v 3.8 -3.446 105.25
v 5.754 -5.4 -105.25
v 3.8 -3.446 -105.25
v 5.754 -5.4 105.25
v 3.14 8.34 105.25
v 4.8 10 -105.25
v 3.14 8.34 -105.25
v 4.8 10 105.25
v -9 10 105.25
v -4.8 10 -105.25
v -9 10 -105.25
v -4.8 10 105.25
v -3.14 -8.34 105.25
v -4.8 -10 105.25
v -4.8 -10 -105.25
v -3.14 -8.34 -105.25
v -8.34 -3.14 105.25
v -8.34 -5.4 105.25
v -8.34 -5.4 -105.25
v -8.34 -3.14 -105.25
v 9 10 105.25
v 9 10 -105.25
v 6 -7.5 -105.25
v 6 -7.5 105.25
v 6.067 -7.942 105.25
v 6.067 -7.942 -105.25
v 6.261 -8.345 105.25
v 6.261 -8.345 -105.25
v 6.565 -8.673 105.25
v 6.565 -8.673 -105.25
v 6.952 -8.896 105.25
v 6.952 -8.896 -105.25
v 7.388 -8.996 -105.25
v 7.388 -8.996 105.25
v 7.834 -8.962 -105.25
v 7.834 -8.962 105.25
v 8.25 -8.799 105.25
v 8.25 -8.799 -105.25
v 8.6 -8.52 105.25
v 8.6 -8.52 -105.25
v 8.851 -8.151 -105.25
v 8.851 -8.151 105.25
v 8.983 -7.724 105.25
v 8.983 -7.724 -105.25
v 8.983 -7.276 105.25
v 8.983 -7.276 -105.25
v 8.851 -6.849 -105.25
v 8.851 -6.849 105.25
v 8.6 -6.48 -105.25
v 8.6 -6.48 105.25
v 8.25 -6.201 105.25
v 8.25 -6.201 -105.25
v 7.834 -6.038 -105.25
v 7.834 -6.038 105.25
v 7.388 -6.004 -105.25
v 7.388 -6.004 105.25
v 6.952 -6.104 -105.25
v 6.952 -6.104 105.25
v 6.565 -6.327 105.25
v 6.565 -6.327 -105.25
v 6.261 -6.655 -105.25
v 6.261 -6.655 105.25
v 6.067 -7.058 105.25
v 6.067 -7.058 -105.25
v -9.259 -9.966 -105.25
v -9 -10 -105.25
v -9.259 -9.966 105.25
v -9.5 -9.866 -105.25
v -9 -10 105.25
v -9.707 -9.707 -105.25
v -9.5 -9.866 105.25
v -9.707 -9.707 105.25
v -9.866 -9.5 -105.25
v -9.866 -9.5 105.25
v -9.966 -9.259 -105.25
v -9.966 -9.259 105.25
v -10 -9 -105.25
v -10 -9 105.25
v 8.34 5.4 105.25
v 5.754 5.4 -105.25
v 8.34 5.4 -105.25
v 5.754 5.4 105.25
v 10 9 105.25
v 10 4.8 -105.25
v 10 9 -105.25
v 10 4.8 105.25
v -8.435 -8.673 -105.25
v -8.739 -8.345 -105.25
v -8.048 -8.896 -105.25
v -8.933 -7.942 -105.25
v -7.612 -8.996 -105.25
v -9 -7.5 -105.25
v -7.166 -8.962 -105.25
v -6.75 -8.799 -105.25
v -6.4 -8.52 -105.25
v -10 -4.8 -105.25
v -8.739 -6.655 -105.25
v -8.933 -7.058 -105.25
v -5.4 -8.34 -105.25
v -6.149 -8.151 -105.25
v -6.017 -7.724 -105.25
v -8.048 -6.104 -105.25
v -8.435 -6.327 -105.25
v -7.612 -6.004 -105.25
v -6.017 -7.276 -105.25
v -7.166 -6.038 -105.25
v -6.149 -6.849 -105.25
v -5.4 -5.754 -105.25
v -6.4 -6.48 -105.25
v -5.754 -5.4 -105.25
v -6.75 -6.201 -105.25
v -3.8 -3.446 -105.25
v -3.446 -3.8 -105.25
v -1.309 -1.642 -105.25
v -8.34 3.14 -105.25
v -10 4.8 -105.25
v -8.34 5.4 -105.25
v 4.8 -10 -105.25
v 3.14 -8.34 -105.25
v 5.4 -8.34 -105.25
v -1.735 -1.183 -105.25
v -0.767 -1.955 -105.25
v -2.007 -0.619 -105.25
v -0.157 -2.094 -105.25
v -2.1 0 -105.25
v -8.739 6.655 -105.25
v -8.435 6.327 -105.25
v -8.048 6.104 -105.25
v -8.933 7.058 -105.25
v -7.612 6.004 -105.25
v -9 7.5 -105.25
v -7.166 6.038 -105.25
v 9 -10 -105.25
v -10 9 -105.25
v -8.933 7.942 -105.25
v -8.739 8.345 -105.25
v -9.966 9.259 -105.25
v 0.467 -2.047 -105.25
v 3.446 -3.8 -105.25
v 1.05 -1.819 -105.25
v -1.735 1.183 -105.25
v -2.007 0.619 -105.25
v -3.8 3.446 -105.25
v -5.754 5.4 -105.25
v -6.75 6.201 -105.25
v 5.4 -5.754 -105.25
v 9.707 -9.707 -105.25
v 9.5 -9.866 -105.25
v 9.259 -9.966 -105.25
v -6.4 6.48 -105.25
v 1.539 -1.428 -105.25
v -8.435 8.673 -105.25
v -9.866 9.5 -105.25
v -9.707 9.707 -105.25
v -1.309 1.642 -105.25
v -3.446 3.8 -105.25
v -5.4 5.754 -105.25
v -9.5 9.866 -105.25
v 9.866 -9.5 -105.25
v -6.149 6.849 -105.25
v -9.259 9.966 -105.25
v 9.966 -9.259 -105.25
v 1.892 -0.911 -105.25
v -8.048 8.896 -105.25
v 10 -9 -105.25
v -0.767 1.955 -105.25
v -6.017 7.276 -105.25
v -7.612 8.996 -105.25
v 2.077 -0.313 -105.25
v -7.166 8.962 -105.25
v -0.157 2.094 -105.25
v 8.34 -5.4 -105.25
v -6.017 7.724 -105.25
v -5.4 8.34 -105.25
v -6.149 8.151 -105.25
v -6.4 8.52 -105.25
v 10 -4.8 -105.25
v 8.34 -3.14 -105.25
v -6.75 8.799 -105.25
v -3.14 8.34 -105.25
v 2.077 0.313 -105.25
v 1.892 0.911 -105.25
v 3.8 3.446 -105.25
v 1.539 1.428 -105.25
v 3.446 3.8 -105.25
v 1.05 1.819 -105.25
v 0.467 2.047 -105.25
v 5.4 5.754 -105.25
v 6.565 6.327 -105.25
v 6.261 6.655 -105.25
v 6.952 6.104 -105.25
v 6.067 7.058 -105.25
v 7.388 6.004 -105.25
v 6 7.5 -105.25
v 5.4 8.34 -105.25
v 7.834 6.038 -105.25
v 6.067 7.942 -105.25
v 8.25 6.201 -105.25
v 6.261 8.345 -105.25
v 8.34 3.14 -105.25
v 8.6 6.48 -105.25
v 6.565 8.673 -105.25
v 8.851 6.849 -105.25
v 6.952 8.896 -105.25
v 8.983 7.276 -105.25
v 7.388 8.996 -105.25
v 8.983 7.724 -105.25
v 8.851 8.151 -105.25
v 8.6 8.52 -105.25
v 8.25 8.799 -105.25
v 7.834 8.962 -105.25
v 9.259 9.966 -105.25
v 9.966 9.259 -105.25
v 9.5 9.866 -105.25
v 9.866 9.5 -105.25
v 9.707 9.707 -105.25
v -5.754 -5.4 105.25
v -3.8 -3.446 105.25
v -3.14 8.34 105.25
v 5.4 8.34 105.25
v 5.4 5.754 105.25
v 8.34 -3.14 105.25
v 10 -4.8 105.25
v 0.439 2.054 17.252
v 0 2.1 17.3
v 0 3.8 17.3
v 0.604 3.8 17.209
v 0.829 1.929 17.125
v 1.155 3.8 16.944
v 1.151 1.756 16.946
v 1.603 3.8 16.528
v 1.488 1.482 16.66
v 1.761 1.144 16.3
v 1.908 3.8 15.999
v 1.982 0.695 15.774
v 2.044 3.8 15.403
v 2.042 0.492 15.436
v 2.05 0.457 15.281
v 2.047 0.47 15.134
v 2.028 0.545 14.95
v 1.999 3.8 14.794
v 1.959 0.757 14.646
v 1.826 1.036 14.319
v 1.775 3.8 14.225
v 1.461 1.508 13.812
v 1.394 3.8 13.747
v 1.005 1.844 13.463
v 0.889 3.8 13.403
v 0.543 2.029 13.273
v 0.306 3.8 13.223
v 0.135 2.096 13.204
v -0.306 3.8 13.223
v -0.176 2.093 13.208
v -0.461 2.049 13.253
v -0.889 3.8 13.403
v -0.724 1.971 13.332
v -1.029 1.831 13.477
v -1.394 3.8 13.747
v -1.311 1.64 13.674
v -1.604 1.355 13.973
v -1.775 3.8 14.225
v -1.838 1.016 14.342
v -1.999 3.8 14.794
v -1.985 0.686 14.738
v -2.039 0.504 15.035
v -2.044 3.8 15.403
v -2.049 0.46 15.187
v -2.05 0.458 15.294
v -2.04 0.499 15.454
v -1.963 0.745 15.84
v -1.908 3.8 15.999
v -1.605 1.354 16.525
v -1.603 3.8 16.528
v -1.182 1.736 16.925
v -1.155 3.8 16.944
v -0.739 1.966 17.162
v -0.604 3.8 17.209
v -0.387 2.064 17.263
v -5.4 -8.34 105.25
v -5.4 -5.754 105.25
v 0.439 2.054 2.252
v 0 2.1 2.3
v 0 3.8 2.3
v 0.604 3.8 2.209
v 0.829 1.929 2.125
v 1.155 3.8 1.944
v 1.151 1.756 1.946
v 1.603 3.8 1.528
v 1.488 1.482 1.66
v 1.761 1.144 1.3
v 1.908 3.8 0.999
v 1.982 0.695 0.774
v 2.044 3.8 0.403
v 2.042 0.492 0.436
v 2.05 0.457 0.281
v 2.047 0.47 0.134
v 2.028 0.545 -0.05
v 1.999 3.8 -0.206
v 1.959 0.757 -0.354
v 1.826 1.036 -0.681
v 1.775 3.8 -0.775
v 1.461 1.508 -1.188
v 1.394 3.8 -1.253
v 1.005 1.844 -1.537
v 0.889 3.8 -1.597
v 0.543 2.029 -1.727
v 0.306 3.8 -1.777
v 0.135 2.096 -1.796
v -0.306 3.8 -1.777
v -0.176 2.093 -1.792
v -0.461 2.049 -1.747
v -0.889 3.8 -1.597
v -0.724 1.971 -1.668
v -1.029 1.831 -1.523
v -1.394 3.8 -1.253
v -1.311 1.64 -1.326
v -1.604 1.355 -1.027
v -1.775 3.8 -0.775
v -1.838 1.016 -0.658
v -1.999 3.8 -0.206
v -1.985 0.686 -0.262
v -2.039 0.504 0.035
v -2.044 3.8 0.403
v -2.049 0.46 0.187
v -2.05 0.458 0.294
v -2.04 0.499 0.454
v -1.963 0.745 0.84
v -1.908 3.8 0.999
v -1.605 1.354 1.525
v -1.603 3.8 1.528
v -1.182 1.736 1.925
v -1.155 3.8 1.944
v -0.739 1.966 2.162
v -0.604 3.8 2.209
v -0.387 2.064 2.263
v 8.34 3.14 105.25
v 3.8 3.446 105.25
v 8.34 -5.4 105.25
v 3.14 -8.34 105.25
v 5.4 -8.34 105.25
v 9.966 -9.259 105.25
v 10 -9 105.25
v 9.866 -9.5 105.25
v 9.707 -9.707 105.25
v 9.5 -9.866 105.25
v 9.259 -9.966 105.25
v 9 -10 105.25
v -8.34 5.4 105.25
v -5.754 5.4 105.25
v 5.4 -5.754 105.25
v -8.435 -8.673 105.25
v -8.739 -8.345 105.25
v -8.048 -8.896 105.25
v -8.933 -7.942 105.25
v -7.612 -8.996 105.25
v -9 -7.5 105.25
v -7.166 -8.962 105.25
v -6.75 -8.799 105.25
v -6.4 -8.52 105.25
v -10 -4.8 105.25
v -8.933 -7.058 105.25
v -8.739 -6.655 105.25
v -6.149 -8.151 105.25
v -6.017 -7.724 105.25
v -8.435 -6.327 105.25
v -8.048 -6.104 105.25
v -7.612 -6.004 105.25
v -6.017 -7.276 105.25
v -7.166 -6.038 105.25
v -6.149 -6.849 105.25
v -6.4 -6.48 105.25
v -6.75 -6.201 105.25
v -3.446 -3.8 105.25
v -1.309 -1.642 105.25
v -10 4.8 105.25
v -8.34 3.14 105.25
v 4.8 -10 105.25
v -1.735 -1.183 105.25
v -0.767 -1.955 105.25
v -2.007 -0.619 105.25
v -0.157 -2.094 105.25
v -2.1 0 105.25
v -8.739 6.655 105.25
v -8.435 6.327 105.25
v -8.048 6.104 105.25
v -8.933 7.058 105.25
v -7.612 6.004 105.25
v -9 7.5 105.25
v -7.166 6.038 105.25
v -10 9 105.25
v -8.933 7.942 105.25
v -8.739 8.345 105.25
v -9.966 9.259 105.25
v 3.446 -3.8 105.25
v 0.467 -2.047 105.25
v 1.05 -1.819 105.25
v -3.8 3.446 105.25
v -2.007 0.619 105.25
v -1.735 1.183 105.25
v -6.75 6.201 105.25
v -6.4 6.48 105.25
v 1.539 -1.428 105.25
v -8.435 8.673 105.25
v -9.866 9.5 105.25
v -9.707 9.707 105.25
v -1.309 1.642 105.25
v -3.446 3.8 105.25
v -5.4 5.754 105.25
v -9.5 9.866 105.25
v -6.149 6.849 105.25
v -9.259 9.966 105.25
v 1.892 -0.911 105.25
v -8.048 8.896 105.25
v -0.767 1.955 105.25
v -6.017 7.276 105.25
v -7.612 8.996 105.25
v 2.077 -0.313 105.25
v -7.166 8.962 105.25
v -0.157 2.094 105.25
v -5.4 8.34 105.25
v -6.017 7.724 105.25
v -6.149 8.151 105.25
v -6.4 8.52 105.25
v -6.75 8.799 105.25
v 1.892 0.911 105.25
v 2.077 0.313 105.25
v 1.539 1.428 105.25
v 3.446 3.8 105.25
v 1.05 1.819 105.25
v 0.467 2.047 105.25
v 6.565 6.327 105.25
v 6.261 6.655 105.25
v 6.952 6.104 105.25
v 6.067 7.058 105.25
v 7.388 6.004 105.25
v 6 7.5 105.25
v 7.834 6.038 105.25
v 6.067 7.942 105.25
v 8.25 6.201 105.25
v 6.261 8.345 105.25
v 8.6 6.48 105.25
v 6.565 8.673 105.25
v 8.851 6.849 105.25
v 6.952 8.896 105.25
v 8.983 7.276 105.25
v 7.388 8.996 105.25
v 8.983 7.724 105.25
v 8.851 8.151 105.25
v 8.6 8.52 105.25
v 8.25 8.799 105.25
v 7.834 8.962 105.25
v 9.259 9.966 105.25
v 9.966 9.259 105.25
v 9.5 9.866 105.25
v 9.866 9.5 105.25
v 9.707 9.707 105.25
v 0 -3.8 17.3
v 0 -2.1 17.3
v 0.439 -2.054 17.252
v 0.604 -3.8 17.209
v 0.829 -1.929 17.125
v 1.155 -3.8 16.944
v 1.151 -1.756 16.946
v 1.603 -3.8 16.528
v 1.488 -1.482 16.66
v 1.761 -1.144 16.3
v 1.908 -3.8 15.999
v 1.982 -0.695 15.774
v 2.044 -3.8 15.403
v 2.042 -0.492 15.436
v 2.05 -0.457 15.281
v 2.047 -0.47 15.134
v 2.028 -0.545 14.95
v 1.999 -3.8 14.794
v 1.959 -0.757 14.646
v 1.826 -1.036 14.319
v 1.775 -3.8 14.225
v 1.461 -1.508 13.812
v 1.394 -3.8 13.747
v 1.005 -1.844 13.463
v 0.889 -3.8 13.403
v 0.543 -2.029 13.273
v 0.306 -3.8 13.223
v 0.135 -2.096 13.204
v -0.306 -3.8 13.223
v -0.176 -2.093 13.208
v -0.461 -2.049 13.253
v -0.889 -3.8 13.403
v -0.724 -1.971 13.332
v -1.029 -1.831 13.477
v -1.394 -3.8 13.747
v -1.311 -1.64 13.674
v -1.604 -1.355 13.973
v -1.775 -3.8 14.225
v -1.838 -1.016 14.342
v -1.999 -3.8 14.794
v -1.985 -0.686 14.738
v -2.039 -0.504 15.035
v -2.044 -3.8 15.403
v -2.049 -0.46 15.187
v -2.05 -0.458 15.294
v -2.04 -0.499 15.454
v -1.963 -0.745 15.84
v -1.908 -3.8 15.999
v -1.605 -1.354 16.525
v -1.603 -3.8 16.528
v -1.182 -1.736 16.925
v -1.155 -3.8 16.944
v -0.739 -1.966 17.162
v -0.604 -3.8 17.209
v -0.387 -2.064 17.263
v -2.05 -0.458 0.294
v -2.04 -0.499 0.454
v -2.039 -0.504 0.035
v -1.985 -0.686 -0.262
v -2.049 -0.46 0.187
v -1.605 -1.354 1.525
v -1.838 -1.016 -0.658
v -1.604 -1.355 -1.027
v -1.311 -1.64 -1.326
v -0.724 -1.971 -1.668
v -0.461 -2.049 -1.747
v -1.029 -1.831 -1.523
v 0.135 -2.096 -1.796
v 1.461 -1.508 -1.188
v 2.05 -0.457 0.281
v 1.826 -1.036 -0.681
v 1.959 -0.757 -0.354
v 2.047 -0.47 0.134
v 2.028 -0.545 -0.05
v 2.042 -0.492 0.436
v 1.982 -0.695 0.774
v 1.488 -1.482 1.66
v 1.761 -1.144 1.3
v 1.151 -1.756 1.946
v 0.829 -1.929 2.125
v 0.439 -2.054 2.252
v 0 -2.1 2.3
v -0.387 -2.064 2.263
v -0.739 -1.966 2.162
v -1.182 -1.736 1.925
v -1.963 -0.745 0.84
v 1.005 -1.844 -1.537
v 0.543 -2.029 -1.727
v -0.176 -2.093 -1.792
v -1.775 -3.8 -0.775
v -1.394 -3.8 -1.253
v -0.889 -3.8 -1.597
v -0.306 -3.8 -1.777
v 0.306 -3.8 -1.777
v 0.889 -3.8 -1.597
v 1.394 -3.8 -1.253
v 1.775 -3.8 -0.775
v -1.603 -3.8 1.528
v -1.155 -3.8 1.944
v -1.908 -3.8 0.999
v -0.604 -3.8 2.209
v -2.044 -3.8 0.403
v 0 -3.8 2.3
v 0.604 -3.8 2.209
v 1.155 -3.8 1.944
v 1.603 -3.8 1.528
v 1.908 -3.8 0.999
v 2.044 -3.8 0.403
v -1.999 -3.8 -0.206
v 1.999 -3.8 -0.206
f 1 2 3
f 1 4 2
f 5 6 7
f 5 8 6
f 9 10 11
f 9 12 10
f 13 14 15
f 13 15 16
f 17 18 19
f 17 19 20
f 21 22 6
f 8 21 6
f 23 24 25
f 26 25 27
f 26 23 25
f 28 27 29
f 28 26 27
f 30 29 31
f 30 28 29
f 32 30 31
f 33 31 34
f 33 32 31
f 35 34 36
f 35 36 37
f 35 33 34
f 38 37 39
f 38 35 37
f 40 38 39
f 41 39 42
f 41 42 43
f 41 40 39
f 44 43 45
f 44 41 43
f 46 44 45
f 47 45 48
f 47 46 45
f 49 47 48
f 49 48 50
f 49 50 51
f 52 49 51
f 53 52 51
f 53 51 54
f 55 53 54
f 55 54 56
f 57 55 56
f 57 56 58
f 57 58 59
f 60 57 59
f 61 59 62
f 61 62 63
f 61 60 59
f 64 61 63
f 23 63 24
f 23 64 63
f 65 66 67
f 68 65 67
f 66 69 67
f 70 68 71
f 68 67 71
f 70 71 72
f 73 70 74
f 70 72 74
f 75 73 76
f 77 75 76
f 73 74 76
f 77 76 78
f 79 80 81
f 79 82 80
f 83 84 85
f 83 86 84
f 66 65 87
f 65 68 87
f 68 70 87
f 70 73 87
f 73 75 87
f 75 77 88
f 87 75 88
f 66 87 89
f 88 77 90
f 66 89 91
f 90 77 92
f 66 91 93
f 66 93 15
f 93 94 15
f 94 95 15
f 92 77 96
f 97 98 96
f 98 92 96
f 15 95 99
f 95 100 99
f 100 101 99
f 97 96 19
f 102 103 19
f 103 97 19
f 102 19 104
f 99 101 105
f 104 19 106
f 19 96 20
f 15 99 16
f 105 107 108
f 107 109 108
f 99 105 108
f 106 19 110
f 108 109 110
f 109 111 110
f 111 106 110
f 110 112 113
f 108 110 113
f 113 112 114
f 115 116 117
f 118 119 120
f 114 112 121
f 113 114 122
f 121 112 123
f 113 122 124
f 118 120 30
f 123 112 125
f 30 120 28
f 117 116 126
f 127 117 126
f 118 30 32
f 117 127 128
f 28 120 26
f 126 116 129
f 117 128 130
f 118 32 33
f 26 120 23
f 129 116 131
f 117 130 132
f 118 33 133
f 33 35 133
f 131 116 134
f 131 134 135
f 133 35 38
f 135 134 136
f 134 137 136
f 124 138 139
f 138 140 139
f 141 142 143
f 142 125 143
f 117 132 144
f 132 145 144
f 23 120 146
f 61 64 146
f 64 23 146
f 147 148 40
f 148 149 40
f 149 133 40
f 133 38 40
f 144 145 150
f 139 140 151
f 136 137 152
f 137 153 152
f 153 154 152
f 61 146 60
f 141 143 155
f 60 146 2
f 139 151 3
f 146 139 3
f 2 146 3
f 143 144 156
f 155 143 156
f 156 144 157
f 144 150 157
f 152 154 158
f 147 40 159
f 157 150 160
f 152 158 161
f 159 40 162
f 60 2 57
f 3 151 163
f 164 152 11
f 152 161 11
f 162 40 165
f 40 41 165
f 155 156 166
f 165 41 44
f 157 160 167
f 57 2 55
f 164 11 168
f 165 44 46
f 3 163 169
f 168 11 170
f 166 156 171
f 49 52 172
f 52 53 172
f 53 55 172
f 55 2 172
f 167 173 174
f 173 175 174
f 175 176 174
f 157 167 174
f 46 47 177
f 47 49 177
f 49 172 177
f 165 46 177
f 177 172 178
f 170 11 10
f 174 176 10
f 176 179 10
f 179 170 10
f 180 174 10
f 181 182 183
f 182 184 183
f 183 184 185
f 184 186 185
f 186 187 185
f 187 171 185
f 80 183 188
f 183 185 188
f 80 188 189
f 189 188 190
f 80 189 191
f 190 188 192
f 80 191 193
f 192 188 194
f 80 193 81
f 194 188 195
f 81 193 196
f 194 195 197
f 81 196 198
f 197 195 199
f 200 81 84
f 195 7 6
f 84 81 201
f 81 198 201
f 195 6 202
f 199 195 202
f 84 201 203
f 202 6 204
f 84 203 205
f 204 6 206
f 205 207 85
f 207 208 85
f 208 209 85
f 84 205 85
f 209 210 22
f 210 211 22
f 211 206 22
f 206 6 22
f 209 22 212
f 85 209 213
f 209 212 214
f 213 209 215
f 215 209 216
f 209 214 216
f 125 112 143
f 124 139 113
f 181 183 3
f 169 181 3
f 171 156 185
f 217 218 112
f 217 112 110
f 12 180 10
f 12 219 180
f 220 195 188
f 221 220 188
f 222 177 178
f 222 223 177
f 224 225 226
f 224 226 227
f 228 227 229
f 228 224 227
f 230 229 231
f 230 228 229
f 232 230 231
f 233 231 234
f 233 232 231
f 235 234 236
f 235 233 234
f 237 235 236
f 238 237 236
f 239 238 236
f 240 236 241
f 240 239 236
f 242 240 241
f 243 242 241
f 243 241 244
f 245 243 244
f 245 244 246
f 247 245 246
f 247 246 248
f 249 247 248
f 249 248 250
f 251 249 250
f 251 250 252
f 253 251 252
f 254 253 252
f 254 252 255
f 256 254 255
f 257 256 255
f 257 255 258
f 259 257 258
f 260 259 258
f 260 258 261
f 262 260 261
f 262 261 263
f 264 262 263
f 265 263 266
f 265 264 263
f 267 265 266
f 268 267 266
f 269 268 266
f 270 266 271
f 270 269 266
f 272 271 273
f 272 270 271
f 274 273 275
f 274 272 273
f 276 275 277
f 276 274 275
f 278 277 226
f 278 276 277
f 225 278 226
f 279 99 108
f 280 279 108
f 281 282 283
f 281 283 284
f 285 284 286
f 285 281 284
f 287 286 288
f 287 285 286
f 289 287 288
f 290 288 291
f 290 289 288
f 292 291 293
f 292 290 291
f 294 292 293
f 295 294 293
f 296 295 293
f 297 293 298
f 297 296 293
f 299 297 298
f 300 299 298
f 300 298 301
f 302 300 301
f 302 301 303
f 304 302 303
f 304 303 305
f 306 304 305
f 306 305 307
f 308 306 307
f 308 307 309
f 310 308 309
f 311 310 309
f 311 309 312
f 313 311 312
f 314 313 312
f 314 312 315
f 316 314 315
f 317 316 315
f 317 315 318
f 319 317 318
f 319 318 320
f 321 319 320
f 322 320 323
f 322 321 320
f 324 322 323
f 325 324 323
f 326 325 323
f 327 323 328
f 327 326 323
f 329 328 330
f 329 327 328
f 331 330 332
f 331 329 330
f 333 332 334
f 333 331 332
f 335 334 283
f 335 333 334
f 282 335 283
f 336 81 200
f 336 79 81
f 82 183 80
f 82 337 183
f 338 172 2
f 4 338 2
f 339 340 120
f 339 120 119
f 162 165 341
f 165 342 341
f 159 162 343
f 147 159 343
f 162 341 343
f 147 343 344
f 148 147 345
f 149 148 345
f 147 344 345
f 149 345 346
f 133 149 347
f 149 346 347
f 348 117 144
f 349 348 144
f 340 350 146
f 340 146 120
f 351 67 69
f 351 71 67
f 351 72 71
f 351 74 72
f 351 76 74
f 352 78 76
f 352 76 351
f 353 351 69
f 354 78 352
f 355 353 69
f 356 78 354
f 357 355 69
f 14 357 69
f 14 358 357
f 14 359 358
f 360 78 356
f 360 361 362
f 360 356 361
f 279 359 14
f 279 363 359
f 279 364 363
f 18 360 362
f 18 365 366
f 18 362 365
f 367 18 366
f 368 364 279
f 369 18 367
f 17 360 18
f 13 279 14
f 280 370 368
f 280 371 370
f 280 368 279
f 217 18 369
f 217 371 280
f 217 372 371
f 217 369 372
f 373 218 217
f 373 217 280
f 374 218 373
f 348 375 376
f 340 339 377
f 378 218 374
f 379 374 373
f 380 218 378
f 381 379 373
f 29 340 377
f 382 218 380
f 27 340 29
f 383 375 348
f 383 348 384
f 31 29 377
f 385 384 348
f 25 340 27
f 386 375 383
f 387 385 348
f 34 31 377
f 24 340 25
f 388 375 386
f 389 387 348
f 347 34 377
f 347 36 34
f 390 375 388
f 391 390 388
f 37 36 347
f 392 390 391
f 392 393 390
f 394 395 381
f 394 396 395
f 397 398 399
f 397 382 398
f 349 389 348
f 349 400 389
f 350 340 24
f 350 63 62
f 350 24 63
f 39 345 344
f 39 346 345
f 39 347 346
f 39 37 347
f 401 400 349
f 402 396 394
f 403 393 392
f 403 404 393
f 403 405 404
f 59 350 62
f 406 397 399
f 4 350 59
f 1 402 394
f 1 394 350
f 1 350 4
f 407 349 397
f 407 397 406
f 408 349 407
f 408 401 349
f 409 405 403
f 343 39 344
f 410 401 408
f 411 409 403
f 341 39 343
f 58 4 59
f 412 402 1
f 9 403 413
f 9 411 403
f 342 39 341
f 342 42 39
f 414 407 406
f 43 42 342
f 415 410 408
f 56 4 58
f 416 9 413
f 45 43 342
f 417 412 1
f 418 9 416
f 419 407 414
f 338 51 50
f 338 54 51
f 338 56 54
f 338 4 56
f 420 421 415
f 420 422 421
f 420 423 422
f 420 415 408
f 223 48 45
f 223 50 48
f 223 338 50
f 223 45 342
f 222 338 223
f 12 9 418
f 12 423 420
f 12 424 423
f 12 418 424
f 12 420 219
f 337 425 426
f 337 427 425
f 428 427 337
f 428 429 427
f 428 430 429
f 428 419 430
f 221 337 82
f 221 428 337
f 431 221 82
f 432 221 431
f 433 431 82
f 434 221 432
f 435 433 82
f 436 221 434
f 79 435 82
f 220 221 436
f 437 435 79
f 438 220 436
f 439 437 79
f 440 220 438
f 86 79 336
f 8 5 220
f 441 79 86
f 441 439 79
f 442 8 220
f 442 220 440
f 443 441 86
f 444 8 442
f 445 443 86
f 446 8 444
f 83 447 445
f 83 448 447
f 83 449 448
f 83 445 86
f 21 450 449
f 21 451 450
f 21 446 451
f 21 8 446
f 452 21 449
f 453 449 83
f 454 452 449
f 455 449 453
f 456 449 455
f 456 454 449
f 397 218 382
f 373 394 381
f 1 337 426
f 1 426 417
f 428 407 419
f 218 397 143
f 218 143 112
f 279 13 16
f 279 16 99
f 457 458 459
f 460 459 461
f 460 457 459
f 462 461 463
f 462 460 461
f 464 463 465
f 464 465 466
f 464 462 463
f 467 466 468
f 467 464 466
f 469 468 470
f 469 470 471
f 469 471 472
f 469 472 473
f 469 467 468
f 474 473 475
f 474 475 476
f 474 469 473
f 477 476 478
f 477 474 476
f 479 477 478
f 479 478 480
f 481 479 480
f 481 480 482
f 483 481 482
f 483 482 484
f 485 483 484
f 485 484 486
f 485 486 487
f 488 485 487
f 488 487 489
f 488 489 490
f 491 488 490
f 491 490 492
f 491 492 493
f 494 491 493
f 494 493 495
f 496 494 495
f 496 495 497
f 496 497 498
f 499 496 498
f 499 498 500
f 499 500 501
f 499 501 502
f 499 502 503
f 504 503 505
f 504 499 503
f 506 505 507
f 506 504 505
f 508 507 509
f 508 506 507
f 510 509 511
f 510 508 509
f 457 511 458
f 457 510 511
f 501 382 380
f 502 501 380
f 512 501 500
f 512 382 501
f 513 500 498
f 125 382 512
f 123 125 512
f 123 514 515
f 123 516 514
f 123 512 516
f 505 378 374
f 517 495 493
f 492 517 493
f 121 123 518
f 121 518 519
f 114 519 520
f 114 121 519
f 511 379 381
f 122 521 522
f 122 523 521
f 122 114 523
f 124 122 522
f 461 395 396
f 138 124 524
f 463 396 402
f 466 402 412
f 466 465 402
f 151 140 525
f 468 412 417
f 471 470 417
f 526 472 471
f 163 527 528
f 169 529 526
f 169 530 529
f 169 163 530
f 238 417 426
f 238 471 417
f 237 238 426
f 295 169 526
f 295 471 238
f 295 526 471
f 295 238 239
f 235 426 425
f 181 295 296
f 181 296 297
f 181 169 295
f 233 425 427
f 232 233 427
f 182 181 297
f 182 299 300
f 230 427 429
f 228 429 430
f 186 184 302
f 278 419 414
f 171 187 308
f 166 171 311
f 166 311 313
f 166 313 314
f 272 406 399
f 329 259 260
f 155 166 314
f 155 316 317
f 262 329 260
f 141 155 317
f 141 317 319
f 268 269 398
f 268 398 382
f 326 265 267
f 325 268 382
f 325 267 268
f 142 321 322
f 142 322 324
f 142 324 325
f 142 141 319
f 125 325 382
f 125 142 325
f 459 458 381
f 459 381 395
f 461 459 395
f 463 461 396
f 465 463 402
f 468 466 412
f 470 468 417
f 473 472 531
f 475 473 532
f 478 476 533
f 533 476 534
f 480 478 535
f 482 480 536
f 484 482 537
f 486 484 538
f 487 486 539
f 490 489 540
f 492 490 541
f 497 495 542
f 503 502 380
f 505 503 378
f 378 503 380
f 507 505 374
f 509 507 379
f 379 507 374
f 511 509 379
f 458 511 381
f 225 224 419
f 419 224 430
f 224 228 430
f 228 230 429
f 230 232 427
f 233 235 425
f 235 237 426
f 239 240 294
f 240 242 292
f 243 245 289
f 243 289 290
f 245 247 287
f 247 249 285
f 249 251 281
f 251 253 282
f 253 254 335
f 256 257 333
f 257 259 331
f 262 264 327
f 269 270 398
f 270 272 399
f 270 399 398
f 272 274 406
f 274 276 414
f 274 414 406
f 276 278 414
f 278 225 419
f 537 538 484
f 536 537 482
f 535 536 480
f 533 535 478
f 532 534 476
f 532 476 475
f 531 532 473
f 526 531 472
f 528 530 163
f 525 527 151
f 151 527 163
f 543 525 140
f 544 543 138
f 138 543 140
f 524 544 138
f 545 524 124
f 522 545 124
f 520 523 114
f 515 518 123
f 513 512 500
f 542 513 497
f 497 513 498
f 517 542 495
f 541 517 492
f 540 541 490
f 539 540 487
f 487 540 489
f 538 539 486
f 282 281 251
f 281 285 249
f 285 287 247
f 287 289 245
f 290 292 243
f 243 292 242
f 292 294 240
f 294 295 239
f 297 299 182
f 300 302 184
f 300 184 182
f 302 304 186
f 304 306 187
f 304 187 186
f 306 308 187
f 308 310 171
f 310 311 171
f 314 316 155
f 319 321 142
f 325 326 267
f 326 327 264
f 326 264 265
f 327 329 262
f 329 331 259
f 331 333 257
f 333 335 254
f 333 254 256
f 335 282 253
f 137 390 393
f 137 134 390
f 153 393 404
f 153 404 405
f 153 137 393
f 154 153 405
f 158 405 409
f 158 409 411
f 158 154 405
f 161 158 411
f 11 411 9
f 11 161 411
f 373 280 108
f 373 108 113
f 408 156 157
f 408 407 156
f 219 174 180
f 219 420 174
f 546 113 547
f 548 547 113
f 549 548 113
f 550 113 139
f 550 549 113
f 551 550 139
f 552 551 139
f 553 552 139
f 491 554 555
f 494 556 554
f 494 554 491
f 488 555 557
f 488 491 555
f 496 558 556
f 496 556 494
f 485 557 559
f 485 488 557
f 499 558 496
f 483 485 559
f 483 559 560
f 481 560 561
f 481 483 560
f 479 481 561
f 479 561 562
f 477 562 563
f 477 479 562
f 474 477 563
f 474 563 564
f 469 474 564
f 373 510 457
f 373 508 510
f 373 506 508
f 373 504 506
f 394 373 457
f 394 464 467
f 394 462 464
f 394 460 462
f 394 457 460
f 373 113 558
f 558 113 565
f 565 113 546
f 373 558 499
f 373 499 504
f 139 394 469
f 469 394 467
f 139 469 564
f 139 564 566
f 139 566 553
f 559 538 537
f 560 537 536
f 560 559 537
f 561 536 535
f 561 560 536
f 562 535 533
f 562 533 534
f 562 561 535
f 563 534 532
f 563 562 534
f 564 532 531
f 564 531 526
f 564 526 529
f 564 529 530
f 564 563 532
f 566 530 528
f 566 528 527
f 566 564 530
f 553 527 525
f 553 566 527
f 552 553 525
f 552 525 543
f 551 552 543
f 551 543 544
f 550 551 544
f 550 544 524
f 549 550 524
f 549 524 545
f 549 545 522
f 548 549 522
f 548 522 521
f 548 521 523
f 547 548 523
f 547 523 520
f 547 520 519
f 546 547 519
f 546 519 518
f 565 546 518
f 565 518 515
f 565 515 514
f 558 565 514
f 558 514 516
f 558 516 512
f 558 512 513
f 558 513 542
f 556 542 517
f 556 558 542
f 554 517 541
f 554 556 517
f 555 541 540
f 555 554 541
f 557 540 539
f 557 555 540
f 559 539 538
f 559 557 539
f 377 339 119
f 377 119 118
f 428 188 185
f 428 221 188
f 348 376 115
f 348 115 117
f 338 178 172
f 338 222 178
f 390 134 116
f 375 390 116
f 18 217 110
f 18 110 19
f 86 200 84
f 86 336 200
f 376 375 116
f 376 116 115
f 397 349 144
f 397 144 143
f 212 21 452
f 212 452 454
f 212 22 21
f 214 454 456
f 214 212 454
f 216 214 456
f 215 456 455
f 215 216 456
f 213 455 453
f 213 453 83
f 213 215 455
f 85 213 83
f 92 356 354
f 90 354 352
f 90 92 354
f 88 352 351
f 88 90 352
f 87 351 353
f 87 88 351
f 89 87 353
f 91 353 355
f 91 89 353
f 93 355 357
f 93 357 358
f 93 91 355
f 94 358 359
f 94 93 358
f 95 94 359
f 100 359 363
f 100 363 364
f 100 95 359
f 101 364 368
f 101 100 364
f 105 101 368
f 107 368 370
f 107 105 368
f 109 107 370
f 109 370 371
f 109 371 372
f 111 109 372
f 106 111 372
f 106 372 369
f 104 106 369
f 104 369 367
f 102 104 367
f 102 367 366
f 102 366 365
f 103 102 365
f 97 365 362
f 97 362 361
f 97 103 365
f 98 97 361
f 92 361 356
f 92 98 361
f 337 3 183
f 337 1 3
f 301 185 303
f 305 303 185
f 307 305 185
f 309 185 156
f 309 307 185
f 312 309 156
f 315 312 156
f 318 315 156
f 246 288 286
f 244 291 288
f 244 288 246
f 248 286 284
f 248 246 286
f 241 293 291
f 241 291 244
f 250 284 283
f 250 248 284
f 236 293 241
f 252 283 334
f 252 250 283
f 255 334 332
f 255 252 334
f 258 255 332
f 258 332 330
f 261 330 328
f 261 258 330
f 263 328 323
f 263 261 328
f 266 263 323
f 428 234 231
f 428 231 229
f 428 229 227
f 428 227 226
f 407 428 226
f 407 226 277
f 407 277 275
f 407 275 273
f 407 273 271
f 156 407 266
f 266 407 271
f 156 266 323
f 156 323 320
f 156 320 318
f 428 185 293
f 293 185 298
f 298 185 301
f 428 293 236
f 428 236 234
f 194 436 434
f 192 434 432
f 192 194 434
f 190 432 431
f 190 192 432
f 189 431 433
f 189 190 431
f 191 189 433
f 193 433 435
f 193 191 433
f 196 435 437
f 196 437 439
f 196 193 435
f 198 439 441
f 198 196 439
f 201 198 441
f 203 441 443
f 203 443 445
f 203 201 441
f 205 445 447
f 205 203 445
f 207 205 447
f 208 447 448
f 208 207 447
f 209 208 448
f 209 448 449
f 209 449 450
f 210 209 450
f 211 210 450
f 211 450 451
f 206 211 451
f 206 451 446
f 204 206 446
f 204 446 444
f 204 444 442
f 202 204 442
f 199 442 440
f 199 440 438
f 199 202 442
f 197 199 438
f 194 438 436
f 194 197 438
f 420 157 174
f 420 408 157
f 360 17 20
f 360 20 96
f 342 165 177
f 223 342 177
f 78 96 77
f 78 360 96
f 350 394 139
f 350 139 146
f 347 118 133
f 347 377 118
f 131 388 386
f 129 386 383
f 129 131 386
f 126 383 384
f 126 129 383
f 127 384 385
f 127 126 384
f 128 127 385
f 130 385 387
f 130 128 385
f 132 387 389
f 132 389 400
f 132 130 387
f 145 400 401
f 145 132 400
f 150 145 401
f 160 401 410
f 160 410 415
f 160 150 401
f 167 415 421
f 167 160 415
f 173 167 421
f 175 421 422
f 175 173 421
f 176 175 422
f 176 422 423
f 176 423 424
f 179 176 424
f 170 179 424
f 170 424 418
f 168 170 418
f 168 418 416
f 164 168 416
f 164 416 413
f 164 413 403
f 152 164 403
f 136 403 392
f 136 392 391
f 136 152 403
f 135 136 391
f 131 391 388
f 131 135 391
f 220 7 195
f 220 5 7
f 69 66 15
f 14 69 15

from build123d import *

# Parameters (mm, degrees)
SKETCH_1_R               = 1.5
SKETCH_1_R_2             = 2.1
EXTRUDE_1_DEPTH          = 105.25
FILLET_1_R               = 1
CUT_EXTRUDE_1_DEPTH      = 107.620835206
CUT_EXTRUDE_1_DEPTH_BACK = 107.620835206
SKETCH_2_R               = 2.05


with BuildPart() as part:
    # 草图1 → 凸台-拉伸1 (new, symmetric)
    with BuildSketch(Plane.XY):
        Polygon((-10, 10), (-10, 4.8), (-8.34, 3.14), (-8.34, 5.4), (-5.753553391, 5.4), (-3.8, 3.446446609), (-3.8, -3.446446609), (-5.753553391, -5.4), (-8.34, -5.4), (-8.34, -3.14), (-10, -4.8), (-10, -10), (-4.8, -10), (-3.14, -8.34), (-5.4, -8.34), (-5.4, -5.753553391), (-3.446446609, -3.8), (3.446446609, -3.8), (5.4, -5.753553391), (5.4, -8.34), (3.14, -8.34), (4.8, -10), (10, -10), (10, -4.8), (8.34, -3.14), (8.34, -5.4), (5.753553391, -5.4), (3.8, -3.446446609), (3.8, 3.446446609), (5.753553391, 5.4), (8.34, 5.4), (8.34, 3.14), (10, 4.8), (10, 10), (4.8, 10), (3.14, 8.34), (5.4, 8.34), (5.4, 5.753553391), (3.446446609, 3.8), (-3.446446609, 3.8), (-5.4, 5.753553391), (-5.4, 8.34), (-3.14, 8.34), (-4.8, 10), align=None)
        with Locations(Location((-7.5, 7.5, 0), (0, 0, 180))):
            Circle(SKETCH_1_R, mode=Mode.SUBTRACT)
        with Locations(Location((0, 0, 0), (0, 0, 180))):
            Circle(SKETCH_1_R_2, mode=Mode.SUBTRACT)
        with Locations(Location((-7.5, -7.5, 0), (0, 0, 180))):
            Circle(SKETCH_1_R, mode=Mode.SUBTRACT)
        with Locations(Location((7.5, -7.5, 0), (0, 0, 180))):
            Circle(SKETCH_1_R, mode=Mode.SUBTRACT)
        with Locations(Location((7.5, 7.5, 0), (0, 0, 180))):
            Circle(SKETCH_1_R, mode=Mode.SUBTRACT)
    extrude(amount=EXTRUDE_1_DEPTH, both=True)

    # 圆角1
    fillet_1_edges = [part.edges().sort_by_distance(p)[0] for p in [
        (10, 10, 0),
        (10, -10, 0),
        (-10, -10, 0),
        (-10, 10, 0),
    ]]
    fillet(fillet_1_edges, radius=FILLET_1_R)

    # 草图2 → 切除-拉伸1 (cut, two sides: drawn at the far end of the back side and taken through both)
    with BuildSketch(Plane(origin=(0, 3.8, 0), x_dir=(1, 0, 0), z_dir=(0, 1, 0)).offset(-CUT_EXTRUDE_1_DEPTH_BACK)):
        with Locations(Location((0, -15.25, 0), (0, 0, 270))):
            Circle(SKETCH_2_R)
        with Locations(Location((0, -0.25, 0), (0, 0, 270))):
            Circle(SKETCH_2_R)
    extrude(amount=CUT_EXTRUDE_1_DEPTH + CUT_EXTRUDE_1_DEPTH_BACK, mode=Mode.SUBTRACT)


solid = part.part
